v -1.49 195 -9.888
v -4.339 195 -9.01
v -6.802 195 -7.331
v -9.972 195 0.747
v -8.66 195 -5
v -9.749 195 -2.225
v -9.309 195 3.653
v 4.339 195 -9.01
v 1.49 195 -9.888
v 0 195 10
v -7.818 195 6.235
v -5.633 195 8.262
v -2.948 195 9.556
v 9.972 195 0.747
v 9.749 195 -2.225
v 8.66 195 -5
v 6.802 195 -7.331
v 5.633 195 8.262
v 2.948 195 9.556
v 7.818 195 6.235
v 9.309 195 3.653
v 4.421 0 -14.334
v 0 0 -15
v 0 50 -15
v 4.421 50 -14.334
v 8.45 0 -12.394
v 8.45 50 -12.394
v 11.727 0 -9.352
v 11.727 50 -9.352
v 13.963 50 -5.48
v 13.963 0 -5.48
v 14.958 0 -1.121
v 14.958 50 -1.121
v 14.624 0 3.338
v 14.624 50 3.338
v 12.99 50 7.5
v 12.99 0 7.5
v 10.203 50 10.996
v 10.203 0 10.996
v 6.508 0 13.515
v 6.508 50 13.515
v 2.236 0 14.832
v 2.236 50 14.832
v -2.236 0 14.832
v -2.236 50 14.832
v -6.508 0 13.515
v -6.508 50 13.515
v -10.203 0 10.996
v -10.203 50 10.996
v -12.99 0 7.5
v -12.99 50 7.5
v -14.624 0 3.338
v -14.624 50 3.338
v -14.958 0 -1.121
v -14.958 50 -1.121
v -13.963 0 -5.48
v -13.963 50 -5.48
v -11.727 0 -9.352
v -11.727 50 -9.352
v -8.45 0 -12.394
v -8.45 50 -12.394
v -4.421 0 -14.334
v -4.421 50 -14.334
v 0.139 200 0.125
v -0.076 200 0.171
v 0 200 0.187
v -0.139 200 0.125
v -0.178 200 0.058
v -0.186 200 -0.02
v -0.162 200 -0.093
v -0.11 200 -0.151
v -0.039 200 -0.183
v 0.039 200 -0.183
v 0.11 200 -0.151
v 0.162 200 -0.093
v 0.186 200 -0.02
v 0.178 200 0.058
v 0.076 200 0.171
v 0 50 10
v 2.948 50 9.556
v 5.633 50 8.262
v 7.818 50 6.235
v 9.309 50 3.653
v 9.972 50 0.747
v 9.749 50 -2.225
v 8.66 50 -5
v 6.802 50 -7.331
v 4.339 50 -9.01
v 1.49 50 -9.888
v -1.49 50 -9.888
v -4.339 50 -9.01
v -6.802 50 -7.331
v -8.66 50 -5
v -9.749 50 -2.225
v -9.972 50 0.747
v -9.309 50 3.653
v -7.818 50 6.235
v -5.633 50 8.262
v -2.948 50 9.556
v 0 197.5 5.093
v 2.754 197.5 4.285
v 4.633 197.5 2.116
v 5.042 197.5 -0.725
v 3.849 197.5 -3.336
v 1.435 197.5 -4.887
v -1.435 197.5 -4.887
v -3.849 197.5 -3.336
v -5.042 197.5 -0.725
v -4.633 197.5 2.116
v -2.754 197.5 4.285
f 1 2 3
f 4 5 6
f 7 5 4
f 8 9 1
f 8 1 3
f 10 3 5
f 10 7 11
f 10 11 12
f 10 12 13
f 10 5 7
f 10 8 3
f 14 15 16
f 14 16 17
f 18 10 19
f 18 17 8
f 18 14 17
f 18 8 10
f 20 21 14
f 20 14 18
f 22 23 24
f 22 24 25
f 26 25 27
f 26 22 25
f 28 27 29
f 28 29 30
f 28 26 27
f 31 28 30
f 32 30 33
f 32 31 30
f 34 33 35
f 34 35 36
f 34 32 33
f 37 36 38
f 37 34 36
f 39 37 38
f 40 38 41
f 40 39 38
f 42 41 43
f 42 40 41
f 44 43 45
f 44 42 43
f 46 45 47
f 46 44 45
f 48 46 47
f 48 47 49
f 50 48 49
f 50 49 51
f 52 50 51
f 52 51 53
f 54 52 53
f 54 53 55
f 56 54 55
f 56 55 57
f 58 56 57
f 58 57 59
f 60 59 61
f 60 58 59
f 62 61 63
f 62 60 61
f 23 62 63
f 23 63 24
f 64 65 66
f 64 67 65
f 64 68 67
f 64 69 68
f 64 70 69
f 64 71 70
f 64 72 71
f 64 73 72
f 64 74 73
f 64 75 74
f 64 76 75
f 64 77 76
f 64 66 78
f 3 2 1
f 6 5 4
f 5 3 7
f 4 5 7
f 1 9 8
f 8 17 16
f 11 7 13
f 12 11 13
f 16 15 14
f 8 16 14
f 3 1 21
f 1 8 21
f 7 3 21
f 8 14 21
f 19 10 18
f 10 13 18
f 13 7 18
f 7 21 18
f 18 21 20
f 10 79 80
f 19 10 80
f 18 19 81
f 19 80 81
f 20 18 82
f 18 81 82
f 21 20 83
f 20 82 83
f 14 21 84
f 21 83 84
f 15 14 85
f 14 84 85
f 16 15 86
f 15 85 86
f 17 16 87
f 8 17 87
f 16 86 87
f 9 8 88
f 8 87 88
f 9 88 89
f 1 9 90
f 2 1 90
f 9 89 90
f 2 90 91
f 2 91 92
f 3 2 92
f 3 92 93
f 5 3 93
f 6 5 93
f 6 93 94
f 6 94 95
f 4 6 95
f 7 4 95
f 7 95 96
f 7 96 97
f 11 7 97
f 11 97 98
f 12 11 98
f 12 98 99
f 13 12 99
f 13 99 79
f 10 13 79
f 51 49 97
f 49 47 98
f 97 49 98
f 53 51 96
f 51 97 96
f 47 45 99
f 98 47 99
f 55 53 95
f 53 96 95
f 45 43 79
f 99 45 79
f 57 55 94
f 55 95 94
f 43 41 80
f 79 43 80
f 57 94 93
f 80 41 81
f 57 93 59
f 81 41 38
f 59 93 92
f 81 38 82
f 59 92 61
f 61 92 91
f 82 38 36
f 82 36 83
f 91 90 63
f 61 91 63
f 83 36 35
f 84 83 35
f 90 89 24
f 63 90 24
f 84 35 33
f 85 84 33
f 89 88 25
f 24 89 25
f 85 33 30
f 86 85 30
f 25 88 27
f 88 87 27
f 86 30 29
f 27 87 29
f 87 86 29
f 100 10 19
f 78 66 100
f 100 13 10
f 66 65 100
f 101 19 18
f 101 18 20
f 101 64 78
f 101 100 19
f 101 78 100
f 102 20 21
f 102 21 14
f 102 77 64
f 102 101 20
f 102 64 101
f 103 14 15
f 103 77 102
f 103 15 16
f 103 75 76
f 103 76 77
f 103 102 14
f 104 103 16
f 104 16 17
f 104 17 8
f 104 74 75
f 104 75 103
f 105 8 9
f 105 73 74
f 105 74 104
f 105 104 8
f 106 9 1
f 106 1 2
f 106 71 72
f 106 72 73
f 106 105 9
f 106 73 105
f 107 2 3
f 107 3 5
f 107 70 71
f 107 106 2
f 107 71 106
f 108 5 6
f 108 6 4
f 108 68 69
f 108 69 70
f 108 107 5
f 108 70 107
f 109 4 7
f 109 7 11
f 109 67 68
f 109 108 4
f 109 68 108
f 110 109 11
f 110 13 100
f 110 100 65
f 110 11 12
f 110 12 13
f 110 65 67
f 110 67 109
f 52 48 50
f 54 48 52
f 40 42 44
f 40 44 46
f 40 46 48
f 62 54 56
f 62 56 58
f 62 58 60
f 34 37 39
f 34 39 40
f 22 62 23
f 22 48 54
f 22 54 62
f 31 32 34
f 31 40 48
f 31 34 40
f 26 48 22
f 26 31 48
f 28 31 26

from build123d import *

# Parameters (mm, degrees)
SZKIC1_R                    = 10
DODANIE_WYCI_GNI_CIE1_DEPTH = 195
SZKIC2_R                    = 10
DODANIE_WYCI_GNI_CIE2_DEPTH = 5
DODANIE_WYCI_GNI_CIE2_TAPER = 63
SZKIC3_R                    = 15
DODANIE_WYCI_GNI_CIE3_DEPTH = 50


with BuildPart() as part:
    # Szkic1 → Dodanie-wyciągnięcie1 (new body)
    with BuildSketch(Plane(origin=(0, 0, 0), x_dir=(1, 0, 0), z_dir=(0, 1, 0))):
        with Locations(Location((0, 0, 0), (0, 0, 270))):
            Circle(SZKIC1_R)
    extrude(amount=DODANIE_WYCI_GNI_CIE1_DEPTH)

    # Szkic3 → Dodanie-wyciągnięcie3 (add)
    with BuildSketch(Plane.XZ):
        with Locations(Location((0, 0, 0), (0, 0, 270))):
            Circle(SZKIC3_R)
    extrude(amount=-DODANIE_WYCI_GNI_CIE3_DEPTH)


with BuildPart() as body_2:
    # Szkic2 → Dodanie-wyciągnięcie2 (new body)
    with BuildSketch(Plane(origin=(0, 195, 0), x_dir=(1, 0, 0), z_dir=(0, 1, 0))):
        with Locations(Location((0, 0, 0), (0, 0, 270))):
            Circle(SZKIC2_R)
    extrude(amount=DODANIE_WYCI_GNI_CIE2_DEPTH, taper=DODANIE_WYCI_GNI_CIE2_TAPER)


solid = Compound([part.part, body_2.part])
